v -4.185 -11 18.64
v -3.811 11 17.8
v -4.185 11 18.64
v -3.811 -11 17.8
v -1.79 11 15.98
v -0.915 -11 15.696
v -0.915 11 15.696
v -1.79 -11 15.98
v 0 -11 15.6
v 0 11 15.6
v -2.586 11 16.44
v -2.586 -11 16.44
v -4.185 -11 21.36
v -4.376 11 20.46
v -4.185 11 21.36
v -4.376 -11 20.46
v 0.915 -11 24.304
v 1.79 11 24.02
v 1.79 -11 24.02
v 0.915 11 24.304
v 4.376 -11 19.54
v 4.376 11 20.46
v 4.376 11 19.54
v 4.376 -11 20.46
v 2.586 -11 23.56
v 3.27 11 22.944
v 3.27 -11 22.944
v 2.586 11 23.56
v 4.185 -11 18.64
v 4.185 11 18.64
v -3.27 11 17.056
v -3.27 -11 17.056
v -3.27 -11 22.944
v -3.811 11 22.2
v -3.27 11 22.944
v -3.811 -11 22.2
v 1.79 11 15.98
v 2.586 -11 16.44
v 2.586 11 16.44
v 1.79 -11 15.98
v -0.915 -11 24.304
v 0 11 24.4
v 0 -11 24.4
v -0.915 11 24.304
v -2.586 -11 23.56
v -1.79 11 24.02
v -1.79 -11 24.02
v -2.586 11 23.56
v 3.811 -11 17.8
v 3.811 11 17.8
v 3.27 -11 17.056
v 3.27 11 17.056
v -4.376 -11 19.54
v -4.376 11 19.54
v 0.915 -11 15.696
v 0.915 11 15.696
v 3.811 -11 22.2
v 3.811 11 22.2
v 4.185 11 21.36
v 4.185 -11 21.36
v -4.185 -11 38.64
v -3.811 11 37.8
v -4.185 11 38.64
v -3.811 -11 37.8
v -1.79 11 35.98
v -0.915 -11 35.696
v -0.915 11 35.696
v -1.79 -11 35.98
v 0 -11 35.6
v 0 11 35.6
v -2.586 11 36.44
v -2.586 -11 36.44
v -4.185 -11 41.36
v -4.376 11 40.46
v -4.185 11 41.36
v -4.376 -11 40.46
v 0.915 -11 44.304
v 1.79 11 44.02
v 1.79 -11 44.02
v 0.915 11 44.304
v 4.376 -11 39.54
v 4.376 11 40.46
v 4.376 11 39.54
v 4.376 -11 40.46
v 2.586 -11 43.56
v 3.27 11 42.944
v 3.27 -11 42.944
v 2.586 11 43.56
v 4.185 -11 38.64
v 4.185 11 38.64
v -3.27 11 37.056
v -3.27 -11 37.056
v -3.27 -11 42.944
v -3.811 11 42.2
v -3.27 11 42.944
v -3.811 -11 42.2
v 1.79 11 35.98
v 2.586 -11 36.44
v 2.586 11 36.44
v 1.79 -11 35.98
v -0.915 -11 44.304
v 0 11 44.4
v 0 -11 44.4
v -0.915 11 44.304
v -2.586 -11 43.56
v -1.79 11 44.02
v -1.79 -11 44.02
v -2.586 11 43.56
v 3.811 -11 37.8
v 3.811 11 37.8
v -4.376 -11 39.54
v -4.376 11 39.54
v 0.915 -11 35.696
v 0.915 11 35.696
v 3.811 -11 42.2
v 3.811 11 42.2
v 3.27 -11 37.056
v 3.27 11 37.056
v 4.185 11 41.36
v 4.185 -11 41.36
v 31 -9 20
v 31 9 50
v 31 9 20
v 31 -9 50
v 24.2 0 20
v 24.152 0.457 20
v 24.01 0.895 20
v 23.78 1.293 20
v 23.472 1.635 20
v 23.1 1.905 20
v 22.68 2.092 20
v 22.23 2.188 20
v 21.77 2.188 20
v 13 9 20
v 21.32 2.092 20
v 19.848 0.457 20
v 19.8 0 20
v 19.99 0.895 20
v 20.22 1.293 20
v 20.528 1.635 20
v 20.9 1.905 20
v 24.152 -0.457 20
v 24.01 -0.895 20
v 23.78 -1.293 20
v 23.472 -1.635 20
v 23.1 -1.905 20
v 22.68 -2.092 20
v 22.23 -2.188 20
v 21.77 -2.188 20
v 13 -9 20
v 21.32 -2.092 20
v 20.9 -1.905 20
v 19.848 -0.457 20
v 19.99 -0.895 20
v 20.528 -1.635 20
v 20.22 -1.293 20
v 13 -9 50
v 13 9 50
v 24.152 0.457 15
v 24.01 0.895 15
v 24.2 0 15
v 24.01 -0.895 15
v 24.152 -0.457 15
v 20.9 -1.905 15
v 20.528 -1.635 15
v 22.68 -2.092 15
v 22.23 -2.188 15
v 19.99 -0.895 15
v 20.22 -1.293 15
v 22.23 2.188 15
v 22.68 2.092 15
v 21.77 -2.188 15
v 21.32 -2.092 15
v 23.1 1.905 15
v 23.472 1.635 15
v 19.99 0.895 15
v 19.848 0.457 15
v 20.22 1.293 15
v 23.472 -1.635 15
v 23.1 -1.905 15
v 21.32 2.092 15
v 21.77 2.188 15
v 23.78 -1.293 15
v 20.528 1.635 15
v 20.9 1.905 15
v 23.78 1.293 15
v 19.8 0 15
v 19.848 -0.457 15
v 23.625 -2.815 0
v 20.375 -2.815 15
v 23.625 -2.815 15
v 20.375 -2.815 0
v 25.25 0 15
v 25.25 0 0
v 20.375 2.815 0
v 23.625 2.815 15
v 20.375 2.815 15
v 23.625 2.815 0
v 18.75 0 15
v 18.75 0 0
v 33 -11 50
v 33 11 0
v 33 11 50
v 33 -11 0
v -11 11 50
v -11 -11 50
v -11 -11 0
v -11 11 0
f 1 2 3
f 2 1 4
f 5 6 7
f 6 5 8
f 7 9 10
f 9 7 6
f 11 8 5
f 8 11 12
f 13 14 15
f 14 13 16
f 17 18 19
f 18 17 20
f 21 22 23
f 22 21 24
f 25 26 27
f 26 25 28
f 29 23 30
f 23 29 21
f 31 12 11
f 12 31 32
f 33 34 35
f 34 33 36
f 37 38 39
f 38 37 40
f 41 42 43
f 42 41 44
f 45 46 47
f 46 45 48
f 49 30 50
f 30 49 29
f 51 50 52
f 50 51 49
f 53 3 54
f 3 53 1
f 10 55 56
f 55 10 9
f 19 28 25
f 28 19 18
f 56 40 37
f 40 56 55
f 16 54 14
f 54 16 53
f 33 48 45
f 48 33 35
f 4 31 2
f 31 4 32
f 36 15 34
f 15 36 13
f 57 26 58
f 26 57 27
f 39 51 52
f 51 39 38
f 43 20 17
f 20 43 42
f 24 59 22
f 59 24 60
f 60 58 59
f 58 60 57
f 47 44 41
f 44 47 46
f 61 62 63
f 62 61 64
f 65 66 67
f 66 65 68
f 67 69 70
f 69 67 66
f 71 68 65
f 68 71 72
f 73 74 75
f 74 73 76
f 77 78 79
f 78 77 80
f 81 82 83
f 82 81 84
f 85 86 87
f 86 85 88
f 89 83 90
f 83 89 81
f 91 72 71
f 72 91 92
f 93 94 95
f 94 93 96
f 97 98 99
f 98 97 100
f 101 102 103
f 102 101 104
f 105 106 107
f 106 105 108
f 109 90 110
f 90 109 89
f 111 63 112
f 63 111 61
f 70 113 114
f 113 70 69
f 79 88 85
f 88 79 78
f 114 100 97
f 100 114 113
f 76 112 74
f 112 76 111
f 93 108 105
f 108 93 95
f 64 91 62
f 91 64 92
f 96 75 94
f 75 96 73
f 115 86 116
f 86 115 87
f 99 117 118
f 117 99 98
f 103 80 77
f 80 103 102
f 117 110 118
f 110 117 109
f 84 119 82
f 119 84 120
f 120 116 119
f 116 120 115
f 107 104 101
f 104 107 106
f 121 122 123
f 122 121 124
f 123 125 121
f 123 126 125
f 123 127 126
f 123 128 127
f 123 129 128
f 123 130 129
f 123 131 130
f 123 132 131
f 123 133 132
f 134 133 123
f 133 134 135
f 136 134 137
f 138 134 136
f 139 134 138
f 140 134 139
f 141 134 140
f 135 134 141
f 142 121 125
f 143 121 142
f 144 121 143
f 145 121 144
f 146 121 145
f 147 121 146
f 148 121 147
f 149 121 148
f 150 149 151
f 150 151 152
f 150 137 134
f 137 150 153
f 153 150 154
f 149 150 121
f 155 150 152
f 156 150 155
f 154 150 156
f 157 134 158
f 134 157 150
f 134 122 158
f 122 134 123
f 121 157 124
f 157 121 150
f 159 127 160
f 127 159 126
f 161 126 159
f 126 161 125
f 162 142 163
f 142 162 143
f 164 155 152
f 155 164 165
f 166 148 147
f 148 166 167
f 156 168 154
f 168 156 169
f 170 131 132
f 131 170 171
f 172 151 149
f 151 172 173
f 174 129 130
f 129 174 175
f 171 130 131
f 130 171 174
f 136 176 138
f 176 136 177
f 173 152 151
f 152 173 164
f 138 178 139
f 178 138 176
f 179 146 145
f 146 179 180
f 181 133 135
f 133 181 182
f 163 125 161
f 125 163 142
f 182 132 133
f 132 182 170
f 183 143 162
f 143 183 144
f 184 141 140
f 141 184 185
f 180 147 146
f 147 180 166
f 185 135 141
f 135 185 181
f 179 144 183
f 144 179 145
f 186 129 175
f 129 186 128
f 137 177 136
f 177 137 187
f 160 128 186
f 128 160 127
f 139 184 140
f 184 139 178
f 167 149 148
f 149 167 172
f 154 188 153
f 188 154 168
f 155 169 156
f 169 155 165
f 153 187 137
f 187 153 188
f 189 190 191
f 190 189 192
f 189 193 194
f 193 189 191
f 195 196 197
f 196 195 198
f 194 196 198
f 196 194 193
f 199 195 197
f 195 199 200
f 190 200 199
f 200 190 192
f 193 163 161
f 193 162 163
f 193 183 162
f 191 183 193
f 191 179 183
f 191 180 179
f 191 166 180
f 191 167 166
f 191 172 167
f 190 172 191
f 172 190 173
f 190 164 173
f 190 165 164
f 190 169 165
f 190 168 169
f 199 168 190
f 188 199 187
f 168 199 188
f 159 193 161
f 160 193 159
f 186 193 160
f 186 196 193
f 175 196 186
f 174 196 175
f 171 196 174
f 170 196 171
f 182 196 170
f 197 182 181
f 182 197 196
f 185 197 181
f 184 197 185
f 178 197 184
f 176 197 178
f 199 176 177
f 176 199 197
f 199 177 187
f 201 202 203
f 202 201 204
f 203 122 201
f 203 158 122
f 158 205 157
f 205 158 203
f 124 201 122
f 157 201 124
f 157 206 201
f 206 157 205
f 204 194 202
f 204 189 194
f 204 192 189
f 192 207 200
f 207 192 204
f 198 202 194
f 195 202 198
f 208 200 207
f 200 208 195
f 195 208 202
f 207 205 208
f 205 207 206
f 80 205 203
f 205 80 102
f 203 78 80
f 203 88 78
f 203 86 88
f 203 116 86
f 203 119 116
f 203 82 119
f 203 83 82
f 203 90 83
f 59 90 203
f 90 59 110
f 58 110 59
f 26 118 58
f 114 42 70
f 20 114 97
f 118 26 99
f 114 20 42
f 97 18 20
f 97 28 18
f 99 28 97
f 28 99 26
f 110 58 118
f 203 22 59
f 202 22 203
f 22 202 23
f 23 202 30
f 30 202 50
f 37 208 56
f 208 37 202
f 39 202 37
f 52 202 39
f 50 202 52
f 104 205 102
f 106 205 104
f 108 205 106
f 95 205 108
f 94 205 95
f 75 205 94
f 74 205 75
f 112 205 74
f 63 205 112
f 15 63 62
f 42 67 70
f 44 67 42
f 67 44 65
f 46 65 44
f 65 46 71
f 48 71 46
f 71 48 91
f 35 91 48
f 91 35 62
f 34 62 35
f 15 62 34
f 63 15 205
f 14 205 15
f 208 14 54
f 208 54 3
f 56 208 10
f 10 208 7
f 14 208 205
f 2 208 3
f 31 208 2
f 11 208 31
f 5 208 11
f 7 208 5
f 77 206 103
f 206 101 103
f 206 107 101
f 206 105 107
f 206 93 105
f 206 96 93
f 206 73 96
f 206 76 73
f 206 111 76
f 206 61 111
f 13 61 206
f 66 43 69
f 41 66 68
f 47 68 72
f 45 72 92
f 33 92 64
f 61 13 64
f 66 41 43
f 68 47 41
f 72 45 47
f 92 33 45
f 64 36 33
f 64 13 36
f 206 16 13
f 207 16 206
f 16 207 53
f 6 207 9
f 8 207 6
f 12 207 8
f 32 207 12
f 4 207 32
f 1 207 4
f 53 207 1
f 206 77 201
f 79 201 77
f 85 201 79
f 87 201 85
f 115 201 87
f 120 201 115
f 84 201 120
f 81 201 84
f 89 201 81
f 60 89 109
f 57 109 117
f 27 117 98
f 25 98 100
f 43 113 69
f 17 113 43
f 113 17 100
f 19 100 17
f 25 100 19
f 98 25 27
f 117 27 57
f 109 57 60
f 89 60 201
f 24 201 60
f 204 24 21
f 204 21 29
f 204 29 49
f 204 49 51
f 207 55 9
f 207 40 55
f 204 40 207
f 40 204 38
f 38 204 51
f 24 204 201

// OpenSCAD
module corner_base(){	

 translate([-11,-11,0])cube([44,22,50]);

}

module corner_holes(){
 translate([-11,-11,0]){


  // Middle hole
 translate([11,0,20]) rotate([0,0,90]) rotate([0,90,0]) translate([0,0,-100]) cylinder(h = 270, r=4.4, $fn=30);
//TopTop hole
 translate([11,0,40]) rotate([0,0,90]) rotate([0,90,0]) translate([0,0,-100]) cylinder(h = 270, r=4.4, $fn=30);

// Top hole
  translate([5.4*2,-22/2,20+5.4*2+1]) rotate([0,0,0]) cylinder(h = 270, r=5.4, $fn=30);

  translate([0,33,55]) rotate([90,90,90]) cylinder(h = 270, r=4.2);
}

 translate([22-18/2,-22/2+2,20])cube([18,18,52]);

 translate([22-18/2+9,0,-1])cylinder(r=2.2,h=1000,$fn=30);

// Nut hole
 translate([22-18/2+9,0,-15])cylinder(r=6.5/2,h=30,$fn=6);

}

// Final part
module corner(){

 // Rotate the part for better printing
 difference(){
  union(){
   corner_base();

  }
  corner_holes();

 }
}

corner();
